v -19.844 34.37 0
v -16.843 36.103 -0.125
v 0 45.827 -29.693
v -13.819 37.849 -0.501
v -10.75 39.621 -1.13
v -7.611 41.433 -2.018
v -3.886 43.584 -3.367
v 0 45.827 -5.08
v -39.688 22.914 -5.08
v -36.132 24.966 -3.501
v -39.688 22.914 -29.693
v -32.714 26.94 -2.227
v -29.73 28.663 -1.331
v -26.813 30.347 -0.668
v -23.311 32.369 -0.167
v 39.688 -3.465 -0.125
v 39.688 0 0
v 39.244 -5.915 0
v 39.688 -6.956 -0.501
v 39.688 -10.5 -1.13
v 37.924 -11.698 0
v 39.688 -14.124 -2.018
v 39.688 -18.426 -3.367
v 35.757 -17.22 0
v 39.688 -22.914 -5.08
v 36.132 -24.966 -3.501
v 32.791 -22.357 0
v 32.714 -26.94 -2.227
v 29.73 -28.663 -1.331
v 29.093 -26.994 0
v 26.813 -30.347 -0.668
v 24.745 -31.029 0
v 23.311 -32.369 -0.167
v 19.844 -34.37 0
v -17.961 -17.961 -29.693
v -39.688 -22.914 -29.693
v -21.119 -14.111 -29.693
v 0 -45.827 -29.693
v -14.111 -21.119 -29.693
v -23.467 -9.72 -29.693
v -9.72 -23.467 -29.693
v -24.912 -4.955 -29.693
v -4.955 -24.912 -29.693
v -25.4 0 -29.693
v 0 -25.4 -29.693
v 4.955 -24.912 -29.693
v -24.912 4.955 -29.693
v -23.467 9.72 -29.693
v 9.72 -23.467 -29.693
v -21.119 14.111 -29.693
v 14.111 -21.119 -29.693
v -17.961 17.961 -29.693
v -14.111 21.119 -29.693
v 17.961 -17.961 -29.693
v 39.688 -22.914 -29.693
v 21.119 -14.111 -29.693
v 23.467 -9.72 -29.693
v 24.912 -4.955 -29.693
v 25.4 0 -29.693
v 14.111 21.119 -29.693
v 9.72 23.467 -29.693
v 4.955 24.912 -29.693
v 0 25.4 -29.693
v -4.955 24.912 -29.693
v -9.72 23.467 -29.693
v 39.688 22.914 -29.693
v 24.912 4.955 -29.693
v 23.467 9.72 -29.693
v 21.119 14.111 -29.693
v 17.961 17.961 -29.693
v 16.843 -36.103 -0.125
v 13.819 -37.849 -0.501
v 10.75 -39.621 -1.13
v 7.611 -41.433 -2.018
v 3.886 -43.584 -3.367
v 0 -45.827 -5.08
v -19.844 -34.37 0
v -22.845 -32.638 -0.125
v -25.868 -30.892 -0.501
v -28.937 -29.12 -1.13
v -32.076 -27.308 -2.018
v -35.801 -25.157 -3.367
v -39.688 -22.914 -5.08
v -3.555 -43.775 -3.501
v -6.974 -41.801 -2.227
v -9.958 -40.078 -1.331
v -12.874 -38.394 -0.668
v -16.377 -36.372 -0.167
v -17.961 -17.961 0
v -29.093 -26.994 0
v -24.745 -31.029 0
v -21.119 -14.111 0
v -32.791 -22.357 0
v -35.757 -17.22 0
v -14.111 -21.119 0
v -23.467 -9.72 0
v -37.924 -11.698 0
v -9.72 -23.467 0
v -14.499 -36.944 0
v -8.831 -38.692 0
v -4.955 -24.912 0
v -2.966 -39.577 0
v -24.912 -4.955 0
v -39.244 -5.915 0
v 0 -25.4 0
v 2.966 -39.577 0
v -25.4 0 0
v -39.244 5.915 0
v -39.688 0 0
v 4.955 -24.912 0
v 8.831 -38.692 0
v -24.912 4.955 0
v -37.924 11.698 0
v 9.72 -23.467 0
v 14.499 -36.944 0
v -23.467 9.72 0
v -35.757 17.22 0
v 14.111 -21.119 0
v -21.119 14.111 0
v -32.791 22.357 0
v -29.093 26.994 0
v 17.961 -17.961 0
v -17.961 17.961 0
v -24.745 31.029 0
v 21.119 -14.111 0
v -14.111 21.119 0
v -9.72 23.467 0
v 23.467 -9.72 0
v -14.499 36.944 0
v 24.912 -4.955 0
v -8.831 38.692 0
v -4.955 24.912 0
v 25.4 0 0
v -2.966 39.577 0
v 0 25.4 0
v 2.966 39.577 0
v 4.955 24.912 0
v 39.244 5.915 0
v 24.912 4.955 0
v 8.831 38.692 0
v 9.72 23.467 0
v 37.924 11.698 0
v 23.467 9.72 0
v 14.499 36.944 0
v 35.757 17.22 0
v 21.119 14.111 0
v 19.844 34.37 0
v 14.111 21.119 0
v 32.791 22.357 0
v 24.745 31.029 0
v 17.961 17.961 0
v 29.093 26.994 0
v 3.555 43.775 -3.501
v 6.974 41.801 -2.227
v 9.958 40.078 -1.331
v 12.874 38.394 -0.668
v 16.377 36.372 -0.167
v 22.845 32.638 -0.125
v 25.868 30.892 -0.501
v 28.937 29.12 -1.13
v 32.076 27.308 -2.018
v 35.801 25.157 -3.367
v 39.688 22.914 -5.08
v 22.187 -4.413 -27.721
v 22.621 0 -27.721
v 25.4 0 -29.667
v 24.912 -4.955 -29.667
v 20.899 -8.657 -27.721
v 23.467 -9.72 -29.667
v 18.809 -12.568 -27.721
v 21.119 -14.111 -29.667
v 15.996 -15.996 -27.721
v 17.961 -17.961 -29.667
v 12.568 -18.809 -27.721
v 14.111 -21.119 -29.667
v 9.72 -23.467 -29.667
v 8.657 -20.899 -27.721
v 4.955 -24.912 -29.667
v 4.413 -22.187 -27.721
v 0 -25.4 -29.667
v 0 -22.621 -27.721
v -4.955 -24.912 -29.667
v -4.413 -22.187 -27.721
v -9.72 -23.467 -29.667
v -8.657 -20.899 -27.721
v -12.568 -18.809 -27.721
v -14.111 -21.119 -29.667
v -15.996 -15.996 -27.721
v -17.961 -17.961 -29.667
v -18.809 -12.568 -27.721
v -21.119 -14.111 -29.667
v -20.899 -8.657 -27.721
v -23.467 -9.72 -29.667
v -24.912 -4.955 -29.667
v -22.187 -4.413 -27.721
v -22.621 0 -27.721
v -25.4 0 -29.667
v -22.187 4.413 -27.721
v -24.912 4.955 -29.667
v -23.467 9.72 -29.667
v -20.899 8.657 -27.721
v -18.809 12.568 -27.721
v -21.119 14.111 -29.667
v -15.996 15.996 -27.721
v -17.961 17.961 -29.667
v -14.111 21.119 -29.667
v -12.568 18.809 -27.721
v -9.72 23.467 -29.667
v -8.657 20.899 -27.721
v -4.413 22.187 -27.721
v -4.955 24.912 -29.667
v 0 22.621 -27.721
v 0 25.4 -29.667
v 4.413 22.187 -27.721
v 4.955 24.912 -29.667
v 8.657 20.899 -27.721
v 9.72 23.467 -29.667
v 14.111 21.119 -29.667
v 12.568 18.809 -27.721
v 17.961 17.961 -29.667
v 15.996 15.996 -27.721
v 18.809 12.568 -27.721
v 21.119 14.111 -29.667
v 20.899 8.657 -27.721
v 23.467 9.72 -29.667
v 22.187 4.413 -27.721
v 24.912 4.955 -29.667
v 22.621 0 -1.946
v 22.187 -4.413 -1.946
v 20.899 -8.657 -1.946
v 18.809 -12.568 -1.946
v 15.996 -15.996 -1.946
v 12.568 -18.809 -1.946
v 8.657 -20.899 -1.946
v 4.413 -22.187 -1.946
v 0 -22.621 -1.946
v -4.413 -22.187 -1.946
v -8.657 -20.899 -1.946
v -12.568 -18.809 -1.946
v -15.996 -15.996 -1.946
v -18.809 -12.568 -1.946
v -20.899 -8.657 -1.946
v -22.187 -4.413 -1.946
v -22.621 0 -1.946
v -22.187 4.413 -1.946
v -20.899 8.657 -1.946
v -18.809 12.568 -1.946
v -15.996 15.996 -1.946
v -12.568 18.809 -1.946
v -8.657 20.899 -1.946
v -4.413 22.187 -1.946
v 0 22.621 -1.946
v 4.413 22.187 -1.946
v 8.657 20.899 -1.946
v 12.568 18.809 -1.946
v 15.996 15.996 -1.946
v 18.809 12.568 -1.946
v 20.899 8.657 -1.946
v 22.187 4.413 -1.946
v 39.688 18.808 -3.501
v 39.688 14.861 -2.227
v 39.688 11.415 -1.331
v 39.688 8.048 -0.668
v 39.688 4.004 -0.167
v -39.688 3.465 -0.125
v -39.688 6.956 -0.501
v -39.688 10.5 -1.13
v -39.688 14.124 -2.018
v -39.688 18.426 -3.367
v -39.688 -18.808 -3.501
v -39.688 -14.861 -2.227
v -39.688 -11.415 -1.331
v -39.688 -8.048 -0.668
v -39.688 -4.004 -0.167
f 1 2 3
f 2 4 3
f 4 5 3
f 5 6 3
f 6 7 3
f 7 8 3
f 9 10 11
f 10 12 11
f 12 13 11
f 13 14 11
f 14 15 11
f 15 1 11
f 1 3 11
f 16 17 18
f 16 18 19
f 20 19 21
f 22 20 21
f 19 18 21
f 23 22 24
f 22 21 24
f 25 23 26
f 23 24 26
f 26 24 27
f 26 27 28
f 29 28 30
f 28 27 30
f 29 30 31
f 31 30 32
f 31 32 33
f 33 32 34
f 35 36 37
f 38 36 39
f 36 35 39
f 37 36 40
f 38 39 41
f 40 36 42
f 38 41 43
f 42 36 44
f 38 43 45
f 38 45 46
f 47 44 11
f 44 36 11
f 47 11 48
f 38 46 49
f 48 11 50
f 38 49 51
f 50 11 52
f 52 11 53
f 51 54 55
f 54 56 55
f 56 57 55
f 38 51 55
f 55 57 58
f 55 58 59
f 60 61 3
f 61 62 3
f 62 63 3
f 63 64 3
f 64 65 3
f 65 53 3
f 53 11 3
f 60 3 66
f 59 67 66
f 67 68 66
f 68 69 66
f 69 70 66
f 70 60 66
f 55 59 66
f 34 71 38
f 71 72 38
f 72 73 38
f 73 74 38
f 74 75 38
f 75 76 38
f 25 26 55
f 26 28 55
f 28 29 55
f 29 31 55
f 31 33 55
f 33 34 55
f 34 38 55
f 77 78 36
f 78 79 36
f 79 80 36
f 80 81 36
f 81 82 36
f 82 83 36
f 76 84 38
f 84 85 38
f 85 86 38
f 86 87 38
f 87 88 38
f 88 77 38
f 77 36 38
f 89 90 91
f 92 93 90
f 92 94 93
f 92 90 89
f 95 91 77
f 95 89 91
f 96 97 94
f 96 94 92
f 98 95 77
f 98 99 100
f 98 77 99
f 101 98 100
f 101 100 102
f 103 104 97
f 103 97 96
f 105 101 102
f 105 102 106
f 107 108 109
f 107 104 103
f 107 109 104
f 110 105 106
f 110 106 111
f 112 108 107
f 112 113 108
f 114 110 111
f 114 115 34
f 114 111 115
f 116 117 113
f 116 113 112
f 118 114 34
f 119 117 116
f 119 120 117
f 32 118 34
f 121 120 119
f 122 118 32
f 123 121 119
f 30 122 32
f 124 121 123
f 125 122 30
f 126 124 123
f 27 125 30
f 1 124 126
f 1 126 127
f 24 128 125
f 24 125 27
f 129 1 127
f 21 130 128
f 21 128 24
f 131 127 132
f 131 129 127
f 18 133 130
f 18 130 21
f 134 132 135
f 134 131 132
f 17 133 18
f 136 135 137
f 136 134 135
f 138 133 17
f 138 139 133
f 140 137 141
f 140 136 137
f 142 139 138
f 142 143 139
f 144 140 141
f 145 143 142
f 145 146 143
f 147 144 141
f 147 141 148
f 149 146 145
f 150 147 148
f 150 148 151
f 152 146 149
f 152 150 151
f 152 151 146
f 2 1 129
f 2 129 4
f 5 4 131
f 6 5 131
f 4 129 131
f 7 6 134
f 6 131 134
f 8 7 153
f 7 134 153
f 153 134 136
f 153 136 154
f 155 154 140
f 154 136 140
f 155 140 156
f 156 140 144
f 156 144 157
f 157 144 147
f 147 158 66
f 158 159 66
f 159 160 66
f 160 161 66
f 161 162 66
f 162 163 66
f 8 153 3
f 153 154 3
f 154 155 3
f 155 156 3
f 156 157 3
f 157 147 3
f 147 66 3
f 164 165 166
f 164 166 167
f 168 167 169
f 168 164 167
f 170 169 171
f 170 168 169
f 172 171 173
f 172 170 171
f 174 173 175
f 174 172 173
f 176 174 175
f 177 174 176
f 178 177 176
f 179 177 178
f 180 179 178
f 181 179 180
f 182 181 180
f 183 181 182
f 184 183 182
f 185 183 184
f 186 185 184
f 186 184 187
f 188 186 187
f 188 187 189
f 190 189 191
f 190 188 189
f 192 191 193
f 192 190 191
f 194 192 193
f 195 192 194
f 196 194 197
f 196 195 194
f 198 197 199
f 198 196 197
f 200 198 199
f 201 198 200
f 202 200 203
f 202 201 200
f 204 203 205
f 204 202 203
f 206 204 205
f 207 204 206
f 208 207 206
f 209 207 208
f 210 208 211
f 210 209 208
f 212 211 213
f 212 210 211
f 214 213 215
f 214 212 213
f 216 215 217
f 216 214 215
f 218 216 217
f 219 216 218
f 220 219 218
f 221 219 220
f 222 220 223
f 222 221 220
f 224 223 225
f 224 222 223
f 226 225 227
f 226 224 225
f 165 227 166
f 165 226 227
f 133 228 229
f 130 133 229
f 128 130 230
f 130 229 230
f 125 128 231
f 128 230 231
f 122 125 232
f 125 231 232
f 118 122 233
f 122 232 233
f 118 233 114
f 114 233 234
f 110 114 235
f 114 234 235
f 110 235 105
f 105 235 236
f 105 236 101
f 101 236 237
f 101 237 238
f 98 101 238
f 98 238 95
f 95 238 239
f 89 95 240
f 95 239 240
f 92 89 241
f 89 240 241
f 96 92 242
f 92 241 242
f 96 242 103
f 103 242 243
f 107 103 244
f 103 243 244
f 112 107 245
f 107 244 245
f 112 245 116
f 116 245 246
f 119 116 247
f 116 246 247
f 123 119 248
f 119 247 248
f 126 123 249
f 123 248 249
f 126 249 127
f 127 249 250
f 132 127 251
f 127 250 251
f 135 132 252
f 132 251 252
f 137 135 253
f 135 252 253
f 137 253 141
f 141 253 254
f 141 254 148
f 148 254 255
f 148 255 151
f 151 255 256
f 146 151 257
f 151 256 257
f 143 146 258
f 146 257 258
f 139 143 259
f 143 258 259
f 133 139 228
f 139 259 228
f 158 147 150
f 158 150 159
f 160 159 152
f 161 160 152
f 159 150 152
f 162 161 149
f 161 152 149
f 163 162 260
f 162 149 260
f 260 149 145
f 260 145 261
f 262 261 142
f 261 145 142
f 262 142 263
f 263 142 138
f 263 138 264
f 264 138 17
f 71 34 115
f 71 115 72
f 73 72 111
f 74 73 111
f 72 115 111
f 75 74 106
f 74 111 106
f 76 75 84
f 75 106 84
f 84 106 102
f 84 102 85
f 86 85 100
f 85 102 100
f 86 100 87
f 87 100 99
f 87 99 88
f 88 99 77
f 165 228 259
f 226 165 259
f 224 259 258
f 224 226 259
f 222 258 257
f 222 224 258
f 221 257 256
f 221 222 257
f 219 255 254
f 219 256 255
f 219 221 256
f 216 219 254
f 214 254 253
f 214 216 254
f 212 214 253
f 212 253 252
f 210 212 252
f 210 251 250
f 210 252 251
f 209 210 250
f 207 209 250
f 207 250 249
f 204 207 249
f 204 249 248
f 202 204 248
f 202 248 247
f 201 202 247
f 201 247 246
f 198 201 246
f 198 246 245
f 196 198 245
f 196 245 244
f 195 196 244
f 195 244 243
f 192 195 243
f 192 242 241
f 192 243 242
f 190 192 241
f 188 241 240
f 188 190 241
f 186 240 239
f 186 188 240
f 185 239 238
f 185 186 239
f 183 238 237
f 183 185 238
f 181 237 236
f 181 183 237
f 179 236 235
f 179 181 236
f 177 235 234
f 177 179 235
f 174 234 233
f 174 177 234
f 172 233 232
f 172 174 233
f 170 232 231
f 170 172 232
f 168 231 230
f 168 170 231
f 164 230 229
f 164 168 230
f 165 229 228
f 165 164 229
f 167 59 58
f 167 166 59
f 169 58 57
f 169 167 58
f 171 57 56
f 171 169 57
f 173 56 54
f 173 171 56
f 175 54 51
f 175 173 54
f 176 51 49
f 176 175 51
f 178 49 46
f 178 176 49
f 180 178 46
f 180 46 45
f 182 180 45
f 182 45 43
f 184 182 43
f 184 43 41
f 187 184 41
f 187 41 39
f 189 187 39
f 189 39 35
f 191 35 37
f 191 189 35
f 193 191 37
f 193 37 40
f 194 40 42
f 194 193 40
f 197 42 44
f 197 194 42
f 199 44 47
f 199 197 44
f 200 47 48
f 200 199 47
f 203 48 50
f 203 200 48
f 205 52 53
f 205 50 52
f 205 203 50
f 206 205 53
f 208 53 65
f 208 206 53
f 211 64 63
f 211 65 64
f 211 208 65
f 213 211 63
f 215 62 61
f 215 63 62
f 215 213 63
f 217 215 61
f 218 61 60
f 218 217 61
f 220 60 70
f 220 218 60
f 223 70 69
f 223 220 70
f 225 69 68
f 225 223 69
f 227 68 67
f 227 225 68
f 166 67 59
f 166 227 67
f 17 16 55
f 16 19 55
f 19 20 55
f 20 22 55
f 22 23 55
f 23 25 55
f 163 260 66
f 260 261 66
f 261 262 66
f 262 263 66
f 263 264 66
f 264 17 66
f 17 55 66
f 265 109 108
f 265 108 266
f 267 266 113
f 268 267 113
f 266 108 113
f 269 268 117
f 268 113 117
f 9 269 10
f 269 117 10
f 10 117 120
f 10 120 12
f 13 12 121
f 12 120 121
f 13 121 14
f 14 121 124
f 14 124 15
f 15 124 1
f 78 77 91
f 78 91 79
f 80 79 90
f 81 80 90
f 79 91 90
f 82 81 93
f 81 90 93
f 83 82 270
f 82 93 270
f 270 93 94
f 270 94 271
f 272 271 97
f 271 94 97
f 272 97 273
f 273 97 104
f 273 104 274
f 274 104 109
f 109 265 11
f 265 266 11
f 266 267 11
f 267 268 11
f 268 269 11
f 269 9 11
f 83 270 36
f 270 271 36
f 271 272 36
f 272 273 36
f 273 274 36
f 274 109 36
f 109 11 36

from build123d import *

# Parameters (mm, degrees)
THREADSCHEMATIC_START     = -29.6926
THREADSCHEMATIC_OUTLINE_R = 22.62124
THREADSCHEMATIC_DEPTH     = 29.6926


# Read off the part's stored shape, not the designer's step: ThreadSchematic
with BuildPart() as part:
    # ThreadSchematic outline → ThreadSchematic (new body)
    with BuildSketch(Plane.XY.offset(THREADSCHEMATIC_START)):
        Polygon((39.6875, 22.913588808), (0, 45.827177617), (-39.6875, 22.913588808), (-39.6875, -22.913588808), (0, -45.827177617), (39.6875, -22.913588808), align=None)
        Circle(THREADSCHEMATIC_OUTLINE_R, mode=Mode.SUBTRACT)
    extrude(amount=THREADSCHEMATIC_DEPTH)

    # Sketch2 → Single-Chamfer (revolve, cut)
    with BuildSketch(Plane(origin=(0, 0, 0), x_dir=(0, 0, -1), z_dir=(1, 0, 0))):
        Polygon((0, 39.6875), (-12.7, 39.6875), (-12.7, 58.527177617), (5.08, 58.527177617), (5.08, 45.827177617), align=None)
    revolve(axis=Axis((0, 0, 0), (0, 0, -1)), mode=Mode.SUBTRACT)

    # Sketch3 → EndChamfer (revolve, cut)
    with BuildSketch(Plane(origin=(0, 0, 0), x_dir=(0, 0, -1), z_dir=(1, 0, 0)), mode=Mode.PRIVATE) as endchamfer_sk:
        Polygon((29.6672, 25.4), (27.526920431, 22.343364), (29.718, 22.343364), (29.718, 25.4), align=None)
        Polygon((-0.0508, 25.4), (0, 25.4), (2.140279569, 22.343364), (-0.0508, 22.343364), align=None)
    revolve(endchamfer_sk.sketch.rotate(Axis((0, 0, -25.037505729), (0, 0, -1)), 90), axis=Axis((0, 0, -25.037505729), (0, 0, -1)), mode=Mode.SUBTRACT)


solid = part.part
